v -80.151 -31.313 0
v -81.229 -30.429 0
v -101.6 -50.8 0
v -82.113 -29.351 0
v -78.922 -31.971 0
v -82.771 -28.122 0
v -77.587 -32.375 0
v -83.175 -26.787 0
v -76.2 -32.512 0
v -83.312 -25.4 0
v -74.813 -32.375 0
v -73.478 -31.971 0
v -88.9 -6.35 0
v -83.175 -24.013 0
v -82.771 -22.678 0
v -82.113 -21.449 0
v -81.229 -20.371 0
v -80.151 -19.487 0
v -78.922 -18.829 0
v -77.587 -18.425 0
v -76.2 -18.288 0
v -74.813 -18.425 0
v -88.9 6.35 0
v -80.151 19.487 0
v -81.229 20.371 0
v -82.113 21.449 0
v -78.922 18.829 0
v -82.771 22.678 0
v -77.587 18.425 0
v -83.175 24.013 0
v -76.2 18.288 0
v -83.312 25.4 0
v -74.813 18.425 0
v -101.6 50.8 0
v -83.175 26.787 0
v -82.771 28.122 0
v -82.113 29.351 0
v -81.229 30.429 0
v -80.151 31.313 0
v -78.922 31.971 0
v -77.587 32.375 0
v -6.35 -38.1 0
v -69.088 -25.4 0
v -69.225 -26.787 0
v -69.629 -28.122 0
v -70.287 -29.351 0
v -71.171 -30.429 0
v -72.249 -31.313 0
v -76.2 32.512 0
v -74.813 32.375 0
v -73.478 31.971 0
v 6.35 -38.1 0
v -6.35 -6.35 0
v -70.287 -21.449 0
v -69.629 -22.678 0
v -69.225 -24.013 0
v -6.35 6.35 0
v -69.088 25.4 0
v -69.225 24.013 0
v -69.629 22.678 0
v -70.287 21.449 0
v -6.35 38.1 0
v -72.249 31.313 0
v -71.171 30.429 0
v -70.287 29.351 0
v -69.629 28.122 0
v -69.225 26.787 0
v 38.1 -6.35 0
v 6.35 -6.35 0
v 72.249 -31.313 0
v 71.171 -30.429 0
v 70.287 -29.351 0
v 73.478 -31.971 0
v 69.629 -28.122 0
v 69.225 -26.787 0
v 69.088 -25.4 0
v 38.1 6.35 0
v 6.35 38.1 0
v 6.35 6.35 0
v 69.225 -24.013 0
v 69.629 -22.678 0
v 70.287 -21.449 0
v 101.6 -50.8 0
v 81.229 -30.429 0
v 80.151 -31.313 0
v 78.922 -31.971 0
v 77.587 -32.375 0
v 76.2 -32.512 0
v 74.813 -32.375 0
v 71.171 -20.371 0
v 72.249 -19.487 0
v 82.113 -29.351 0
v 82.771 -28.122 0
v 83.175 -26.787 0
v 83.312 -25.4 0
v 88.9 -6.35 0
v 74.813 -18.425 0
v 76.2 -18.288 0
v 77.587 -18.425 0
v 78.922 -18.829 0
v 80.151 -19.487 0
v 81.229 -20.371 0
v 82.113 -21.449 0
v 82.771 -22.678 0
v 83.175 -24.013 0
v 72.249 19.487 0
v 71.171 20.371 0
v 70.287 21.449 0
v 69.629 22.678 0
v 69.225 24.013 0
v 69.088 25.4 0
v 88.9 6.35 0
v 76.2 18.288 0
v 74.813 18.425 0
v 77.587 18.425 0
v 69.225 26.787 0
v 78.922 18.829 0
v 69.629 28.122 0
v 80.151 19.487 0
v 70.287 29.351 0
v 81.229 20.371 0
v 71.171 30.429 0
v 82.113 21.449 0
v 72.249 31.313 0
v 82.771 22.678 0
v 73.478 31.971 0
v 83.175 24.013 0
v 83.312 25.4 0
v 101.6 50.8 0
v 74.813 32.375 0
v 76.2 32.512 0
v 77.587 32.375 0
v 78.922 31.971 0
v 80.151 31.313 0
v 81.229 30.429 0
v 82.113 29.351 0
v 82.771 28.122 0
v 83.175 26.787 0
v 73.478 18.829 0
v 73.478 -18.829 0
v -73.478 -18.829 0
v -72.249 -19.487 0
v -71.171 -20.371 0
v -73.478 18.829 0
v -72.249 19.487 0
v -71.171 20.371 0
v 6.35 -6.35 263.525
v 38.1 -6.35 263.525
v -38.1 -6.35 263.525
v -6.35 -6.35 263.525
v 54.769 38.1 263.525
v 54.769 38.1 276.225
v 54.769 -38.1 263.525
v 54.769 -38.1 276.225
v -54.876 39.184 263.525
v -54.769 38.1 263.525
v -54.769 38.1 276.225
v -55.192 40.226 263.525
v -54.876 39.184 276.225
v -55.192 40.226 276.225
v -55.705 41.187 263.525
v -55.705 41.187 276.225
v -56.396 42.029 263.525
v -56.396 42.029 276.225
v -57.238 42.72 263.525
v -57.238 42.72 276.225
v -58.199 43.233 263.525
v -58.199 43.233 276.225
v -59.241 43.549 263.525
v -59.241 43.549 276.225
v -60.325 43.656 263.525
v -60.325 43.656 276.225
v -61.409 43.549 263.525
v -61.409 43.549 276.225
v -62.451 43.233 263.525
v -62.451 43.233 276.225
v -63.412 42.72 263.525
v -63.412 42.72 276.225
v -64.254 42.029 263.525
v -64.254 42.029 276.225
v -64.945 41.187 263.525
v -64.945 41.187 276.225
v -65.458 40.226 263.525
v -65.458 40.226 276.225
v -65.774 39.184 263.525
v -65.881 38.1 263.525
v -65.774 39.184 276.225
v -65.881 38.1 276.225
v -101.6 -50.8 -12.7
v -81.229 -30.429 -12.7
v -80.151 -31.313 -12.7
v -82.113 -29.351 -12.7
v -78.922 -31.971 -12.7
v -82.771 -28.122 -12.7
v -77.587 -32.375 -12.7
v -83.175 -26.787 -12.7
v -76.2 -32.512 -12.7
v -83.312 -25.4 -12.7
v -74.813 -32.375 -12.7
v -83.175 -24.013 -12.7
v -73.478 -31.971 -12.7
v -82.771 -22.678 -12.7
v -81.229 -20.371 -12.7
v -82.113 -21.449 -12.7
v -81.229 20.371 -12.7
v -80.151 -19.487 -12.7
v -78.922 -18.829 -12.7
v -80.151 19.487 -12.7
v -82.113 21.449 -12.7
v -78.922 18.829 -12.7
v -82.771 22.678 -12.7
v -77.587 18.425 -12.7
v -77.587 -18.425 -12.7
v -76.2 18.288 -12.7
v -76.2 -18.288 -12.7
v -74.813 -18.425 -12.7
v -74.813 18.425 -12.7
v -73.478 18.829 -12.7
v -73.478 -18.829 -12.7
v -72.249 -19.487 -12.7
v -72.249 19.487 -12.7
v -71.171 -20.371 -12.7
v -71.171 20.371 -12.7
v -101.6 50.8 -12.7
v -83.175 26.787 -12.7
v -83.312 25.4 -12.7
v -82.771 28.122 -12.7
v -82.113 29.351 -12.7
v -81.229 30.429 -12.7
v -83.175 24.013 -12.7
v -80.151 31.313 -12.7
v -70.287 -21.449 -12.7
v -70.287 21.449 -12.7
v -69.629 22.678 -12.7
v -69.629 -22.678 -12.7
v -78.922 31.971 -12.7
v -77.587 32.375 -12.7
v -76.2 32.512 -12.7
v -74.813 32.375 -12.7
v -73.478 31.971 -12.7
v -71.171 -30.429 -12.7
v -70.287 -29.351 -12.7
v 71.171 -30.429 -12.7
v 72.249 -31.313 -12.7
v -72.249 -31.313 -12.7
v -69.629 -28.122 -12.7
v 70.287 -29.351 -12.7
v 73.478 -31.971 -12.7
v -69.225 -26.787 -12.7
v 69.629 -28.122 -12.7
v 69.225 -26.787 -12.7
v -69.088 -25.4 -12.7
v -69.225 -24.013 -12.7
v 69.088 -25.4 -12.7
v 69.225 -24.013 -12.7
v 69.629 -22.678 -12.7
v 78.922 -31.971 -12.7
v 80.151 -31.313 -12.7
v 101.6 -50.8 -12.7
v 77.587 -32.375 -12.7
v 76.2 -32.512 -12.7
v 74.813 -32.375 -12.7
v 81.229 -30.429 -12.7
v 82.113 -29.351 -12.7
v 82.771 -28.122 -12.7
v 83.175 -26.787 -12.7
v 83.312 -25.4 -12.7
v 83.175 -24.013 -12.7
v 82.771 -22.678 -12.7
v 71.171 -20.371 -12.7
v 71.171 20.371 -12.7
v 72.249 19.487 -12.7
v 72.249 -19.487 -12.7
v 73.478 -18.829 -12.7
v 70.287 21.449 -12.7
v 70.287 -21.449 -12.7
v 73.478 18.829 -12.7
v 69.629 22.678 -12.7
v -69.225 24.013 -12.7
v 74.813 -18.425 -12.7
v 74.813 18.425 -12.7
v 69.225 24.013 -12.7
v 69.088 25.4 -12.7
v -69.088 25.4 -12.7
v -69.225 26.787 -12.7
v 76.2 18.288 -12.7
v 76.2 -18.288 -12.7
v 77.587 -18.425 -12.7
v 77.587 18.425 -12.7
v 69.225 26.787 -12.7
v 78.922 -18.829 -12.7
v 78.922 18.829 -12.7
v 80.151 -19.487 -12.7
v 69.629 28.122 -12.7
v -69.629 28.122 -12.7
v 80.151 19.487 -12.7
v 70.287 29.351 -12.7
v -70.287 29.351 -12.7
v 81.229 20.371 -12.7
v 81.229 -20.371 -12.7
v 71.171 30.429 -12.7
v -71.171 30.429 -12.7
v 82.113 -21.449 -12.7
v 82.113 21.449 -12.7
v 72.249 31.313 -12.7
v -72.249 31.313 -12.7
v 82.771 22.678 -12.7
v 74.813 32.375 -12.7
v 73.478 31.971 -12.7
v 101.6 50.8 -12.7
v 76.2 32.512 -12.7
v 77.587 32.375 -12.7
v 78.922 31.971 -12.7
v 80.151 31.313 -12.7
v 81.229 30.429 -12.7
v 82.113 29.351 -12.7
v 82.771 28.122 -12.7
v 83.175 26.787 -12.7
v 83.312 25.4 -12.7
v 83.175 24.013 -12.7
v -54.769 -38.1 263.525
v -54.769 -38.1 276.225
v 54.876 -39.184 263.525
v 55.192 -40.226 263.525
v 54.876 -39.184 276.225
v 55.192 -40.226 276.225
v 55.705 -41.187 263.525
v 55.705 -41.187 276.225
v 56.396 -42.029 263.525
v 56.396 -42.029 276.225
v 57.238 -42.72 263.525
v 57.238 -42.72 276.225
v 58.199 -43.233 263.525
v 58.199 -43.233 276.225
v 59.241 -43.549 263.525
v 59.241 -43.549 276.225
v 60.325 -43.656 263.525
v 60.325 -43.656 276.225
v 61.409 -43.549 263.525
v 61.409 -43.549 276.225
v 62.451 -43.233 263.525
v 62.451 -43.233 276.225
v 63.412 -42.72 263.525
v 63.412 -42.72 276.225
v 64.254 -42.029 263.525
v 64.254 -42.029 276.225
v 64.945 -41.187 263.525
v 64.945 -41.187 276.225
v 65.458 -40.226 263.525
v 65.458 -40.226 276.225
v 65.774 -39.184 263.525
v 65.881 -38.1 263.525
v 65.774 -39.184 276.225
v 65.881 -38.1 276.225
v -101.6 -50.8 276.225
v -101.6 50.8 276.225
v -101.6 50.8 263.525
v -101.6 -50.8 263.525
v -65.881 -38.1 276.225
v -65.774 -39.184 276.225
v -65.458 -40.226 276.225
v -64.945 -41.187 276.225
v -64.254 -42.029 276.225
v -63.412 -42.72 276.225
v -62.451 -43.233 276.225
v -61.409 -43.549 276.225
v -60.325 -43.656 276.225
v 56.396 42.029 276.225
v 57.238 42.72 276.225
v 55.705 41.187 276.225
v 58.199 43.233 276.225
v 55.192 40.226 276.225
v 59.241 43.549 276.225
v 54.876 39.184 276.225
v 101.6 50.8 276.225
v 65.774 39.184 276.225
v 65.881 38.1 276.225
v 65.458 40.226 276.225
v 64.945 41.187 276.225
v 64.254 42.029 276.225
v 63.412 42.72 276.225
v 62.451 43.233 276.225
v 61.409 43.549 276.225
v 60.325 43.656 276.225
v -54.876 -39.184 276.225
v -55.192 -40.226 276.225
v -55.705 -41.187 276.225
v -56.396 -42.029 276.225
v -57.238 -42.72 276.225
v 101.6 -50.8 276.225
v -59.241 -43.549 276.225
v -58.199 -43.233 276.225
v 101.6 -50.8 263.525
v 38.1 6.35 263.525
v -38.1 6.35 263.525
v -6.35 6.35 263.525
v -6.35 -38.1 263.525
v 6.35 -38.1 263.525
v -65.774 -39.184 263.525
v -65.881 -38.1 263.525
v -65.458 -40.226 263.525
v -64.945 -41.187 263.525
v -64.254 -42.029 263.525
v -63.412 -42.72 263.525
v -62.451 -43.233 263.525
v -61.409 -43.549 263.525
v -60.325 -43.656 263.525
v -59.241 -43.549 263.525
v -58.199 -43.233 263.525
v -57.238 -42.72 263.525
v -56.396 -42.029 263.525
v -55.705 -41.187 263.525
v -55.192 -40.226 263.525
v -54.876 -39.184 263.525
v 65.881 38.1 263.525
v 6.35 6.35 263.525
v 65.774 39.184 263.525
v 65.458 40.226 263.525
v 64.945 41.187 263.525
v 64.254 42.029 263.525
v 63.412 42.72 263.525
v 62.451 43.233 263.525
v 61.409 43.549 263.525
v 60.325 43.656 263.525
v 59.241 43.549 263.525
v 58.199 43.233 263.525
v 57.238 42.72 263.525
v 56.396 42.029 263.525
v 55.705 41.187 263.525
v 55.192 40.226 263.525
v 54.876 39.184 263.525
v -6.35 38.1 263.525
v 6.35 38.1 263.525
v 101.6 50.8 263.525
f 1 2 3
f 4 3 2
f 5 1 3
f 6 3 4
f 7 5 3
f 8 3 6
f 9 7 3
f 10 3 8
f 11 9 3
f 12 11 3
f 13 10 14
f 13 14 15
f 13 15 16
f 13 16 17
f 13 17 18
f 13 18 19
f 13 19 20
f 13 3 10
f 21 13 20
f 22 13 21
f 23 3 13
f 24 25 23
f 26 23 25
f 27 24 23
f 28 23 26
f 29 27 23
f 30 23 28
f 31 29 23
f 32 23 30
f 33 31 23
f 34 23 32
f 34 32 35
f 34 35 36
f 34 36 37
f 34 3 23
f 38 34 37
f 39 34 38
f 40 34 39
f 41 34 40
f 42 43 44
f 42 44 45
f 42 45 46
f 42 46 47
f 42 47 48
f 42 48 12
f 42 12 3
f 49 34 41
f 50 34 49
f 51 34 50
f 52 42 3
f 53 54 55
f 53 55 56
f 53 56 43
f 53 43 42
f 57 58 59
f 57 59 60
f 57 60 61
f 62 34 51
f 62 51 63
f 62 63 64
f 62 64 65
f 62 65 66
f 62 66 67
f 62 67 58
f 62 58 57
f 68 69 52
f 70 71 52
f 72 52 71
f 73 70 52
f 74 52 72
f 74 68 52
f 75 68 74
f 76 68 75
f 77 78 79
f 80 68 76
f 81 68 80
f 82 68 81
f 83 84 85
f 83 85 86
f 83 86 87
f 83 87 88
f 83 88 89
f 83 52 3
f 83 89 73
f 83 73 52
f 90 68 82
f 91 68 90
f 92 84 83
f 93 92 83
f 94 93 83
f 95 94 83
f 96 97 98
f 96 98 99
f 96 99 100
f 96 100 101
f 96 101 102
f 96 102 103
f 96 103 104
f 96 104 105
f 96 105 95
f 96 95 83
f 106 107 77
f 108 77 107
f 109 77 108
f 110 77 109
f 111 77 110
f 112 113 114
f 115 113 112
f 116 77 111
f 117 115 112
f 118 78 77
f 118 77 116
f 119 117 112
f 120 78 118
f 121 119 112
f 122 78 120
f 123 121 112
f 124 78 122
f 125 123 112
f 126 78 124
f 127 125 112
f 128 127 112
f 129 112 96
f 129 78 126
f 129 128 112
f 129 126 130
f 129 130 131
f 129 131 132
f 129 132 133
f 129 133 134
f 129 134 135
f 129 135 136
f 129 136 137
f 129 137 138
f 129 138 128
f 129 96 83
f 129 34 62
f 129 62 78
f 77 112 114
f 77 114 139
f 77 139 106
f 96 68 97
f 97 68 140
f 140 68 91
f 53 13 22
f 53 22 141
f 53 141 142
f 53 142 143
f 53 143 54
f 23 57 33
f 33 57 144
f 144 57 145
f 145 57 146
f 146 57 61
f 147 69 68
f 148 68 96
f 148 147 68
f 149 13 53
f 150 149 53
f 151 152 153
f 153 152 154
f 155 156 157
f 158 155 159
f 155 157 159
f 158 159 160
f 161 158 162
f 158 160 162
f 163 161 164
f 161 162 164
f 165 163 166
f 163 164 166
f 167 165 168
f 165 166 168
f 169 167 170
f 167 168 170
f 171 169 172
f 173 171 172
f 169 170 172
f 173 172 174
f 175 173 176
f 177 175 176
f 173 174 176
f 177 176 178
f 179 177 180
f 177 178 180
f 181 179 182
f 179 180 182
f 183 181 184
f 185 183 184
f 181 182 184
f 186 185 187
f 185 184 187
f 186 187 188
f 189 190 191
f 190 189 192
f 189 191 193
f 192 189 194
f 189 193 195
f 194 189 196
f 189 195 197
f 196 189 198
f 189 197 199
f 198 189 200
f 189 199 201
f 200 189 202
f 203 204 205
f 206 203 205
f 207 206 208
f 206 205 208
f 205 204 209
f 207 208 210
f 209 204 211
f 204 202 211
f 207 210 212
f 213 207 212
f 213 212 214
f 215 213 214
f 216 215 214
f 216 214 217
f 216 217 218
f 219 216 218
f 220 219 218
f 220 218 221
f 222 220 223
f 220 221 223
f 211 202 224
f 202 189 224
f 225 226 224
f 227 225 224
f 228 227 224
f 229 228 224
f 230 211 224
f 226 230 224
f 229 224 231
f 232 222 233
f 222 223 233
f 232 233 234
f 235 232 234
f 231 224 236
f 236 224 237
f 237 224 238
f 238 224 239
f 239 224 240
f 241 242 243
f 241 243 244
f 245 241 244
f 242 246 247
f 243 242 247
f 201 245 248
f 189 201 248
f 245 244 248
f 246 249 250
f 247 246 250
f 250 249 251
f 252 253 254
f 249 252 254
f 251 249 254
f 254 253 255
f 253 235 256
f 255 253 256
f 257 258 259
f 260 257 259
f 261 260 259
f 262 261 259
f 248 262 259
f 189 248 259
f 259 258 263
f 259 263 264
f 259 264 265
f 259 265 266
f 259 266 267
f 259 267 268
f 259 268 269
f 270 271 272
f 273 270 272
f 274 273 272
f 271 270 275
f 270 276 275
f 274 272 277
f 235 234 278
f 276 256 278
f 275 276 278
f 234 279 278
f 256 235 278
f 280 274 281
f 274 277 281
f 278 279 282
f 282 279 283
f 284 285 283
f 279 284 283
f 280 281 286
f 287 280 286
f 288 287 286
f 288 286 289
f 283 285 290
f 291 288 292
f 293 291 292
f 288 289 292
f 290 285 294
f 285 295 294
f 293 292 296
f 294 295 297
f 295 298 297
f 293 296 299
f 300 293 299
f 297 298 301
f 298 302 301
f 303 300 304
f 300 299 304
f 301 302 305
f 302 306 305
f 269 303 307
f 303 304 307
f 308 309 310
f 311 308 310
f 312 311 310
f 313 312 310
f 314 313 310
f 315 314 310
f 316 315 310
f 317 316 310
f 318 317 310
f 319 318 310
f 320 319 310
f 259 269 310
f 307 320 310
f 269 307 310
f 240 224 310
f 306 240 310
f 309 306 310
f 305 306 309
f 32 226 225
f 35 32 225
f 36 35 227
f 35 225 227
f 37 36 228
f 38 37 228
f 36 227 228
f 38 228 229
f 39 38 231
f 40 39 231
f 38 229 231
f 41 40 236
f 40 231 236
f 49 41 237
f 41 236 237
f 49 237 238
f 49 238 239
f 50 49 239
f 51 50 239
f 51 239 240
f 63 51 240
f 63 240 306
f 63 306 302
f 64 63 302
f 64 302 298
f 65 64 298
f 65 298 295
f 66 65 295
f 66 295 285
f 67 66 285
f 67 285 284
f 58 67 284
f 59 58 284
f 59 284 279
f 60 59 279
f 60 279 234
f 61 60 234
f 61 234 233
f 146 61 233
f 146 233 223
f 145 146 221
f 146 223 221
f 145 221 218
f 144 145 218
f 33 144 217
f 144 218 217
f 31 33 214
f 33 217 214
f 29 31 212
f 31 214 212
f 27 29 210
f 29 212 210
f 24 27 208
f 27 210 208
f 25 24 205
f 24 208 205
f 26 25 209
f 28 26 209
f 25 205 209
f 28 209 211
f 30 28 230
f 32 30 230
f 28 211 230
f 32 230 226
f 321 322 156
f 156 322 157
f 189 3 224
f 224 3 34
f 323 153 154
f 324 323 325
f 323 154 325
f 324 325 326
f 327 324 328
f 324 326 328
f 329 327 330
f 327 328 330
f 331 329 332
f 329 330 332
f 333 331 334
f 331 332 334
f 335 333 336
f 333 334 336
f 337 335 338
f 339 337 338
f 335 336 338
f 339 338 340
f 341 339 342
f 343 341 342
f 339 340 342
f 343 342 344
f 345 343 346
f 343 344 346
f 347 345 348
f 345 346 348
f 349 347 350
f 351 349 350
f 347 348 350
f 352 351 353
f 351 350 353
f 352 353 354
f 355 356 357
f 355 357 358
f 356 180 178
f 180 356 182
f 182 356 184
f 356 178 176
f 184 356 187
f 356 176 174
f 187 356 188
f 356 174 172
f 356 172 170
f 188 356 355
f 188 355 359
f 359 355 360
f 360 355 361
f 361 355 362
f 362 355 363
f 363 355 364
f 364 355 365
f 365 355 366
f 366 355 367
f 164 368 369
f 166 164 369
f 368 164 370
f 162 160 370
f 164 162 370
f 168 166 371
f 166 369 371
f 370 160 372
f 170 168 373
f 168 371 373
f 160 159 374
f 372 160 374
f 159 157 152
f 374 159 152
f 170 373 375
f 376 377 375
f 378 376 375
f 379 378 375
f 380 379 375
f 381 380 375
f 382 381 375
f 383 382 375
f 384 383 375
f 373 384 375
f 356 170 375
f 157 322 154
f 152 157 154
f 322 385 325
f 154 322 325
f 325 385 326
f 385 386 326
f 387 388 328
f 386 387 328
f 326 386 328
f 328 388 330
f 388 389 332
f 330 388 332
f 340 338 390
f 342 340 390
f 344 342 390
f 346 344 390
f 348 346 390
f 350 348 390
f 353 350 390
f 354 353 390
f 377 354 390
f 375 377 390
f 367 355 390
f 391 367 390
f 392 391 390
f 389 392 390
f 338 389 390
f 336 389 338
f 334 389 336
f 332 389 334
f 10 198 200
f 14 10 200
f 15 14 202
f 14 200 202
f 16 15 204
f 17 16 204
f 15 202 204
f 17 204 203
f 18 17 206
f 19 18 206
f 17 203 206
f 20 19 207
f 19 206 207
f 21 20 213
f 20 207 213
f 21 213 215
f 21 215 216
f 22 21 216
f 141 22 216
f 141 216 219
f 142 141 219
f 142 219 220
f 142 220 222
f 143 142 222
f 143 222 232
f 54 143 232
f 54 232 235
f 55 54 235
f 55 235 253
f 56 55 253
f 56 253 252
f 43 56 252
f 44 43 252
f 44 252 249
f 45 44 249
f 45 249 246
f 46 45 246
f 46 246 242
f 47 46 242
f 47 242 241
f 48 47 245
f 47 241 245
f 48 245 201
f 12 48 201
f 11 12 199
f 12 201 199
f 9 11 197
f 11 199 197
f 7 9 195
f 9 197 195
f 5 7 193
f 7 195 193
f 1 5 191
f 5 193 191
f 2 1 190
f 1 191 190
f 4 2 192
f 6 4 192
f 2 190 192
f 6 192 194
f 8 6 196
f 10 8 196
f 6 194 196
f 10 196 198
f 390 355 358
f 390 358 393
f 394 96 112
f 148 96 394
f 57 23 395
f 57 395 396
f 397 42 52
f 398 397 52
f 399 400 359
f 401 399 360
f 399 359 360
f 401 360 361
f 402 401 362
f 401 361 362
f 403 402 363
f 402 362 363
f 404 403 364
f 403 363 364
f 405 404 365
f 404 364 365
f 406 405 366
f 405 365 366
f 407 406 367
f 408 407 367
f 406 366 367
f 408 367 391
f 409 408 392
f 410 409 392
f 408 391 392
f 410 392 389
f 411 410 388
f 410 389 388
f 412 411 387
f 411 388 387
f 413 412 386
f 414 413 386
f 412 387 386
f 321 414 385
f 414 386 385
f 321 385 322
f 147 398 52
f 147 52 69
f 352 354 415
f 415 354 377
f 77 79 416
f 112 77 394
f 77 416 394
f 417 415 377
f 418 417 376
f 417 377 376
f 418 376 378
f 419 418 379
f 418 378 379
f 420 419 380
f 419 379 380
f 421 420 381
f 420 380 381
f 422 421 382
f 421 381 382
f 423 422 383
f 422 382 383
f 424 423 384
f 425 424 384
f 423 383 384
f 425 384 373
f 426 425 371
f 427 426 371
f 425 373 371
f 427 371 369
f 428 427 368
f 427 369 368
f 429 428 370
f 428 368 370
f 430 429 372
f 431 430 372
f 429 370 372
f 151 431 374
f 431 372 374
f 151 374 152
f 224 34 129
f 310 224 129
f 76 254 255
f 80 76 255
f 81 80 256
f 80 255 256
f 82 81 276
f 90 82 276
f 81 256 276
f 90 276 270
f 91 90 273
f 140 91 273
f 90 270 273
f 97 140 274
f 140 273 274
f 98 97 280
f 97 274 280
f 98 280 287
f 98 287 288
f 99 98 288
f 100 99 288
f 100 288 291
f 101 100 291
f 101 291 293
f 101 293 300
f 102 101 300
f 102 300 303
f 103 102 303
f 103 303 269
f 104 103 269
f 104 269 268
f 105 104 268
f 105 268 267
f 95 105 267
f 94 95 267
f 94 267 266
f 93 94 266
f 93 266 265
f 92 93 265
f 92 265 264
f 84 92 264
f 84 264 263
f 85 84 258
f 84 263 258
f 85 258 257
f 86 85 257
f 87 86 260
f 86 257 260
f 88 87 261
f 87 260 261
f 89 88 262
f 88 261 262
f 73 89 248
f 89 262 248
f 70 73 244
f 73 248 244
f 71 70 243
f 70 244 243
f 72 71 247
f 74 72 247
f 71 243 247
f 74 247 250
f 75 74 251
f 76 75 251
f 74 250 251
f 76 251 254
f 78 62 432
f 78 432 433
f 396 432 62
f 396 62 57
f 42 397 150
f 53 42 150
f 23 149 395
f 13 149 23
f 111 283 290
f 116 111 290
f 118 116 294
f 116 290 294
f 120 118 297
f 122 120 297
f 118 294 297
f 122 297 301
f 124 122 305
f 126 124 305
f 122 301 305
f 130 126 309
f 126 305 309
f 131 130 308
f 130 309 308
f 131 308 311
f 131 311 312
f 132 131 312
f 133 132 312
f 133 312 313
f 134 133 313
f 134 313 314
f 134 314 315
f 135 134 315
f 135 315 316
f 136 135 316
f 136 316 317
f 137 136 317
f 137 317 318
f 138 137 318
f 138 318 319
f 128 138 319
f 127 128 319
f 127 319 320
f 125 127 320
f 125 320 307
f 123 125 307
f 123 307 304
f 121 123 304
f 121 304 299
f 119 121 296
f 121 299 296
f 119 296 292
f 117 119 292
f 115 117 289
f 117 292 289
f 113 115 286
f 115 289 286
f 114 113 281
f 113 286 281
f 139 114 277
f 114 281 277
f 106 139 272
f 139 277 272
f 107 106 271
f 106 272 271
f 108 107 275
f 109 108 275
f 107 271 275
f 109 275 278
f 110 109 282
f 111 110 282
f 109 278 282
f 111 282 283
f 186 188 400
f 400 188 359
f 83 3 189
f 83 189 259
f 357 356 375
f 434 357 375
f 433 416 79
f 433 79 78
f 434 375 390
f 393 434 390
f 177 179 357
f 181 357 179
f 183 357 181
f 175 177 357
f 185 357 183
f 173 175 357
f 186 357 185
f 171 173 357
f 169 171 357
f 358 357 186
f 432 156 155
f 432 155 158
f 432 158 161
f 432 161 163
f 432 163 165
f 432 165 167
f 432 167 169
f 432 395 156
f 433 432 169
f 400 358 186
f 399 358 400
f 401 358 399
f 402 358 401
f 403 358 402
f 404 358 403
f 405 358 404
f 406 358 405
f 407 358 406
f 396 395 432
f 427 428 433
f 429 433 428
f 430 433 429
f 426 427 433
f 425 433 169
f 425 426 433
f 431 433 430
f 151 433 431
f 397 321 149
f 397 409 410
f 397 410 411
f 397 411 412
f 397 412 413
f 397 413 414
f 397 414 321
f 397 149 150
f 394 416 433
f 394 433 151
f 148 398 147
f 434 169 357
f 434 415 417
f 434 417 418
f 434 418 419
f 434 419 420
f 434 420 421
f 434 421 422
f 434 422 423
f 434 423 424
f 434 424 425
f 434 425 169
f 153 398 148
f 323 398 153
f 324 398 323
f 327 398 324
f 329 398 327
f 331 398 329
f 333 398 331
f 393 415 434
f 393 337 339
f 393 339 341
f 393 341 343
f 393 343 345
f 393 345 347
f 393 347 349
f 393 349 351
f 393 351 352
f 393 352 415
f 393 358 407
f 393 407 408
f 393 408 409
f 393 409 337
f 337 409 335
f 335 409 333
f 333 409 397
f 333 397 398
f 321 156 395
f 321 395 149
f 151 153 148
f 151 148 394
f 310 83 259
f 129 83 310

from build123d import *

# Parameters (mm, degrees)
F0_W      = 203.2
F0_H      = 101.6
F1_DEPTH  = 12.7
F2_D      = 14.224
F4_W      = 203.2
F4_H      = 101.6
F5_DEPTH  = 12.7
F6_W      = 12.7
F6_H      = 31.75
F6_H_2    = 12.7
F6_W_2    = 31.75
F7_DEPTH  = 263.525
F9_DEPTH  = 25.4
F11_DEPTH = 12.7


with BuildPart() as f1:
    # F0 (on Top) → F1 (new body)
    with BuildSketch(Plane.XY):
        Rectangle(F0_W, F0_H)
    extrude(amount=-F1_DEPTH)

    # F2 (through all)
    with Locations(Plane.XY):
        with Locations((-76.2, 25.4), (76.2, 25.4), (76.2, -25.4), (-76.2, -25.4)):
            Hole(F2_D / 2)



with BuildPart() as f5:
    # F4 (on offset) → F5 (new body)
    with BuildSketch(Plane(origin=(0, 0, 276.225), x_dir=(1, 0, 0), z_dir=(0, 0, -1))):
        Rectangle(F4_W, F4_H)
    extrude(amount=F5_DEPTH)

    # F8 (on face) → F9 (cut)
    with BuildSketch(Plane.XY.offset(276.225)):
        with BuildLine():
            Line((-54.76875, -12.7), (-54.76875, 12.7))
            ThreePointArc((-54.76875, 12.7), (-60.325, 7.14375), (-65.88125, 12.7))
            Line((-65.88125, 12.7), (-65.88125, -12.7))
            ThreePointArc((-65.88125, -12.7), (-60.325, -7.14375), (-54.76875, -12.7))
        make_face()
        with BuildLine():
            ThreePointArc((-65.88125, 12.7), (-60.325, 7.14375), (-54.76875, 12.7))
            Line((-54.76875, 12.7), (-54.76875, 38.1))
            ThreePointArc((-54.76875, 38.1), (-60.325, 43.65625), (-65.88125, 38.1))
            Line((-65.88125, 38.1), (-65.88125, 12.7))
        make_face()
        with BuildLine():
            Line((-54.76875, -38.1), (-54.76875, -12.7))
            ThreePointArc((-54.76875, -12.7), (-60.325, -7.14375), (-65.88125, -12.7))
            Line((-65.88125, -12.7), (-65.88125, -38.1))
            ThreePointArc((-65.88125, -38.1), (-60.325, -43.65625), (-54.76875, -38.1))
        make_face()
        with BuildLine():
            Line((54.76875, 12.7), (54.76875, -12.7))
            ThreePointArc((54.76875, -12.7), (60.325, -7.14375), (65.88125, -12.7))
            Line((65.88125, -12.7), (65.88125, 12.7))
            ThreePointArc((65.88125, 12.7), (60.325, 7.14375), (54.76875, 12.7))
        make_face()
        with BuildLine():
            ThreePointArc((65.88125, -12.7), (60.325, -7.14375), (54.76875, -12.7))
            Line((54.76875, -12.7), (54.76875, -38.1))
            ThreePointArc((54.76875, -38.1), (60.325, -43.65625), (65.88125, -38.1))
            Line((65.88125, -38.1), (65.88125, -12.7))
        make_face()
        with BuildLine():
            Line((54.76875, 38.1), (54.76875, 12.7))
            ThreePointArc((54.76875, 12.7), (60.325, 7.14375), (65.88125, 12.7))
            Line((65.88125, 12.7), (65.88125, 38.1))
            ThreePointArc((65.88125, 38.1), (60.325, 43.65625), (54.76875, 38.1))
        make_face()
    extrude(amount=-F9_DEPTH, mode=Mode.SUBTRACT)


with BuildPart() as f7:
    # F6 (on face) → F7 (new body, through all)
    with BuildSketch(Plane.XY):
        with Locations((0, 22.225)):
            Rectangle(F6_W, F6_H)
        Rectangle(F6_W, F6_H_2)
        with Locations((-22.225, 0)):
            Rectangle(F6_W_2, F6_H_2)
        with Locations((22.225, 0)):
            Rectangle(F6_W_2, F6_H_2)
        with Locations((0, -22.225)):
            Rectangle(F6_W, F6_H)
    extrude(amount=F7_DEPTH)


with BuildPart() as f1_1:
    add(f1.part)

    add(f5.part)  # F11 merges F5

    add(f7.part)  # F11 merges F7
    # F10 (on face) → F11 (join)
    with BuildSketch(Plane.XZ.offset(6.35)):
        Polygon((88.9, 0), (38.1, 263.5250000004), (38.1, 7e-10), align=None)
        Polygon((-88.9, 0), (-38.1, 0), (-38.1, 263.5250000004), align=None)
    extrude(amount=-F11_DEPTH)


solid = f1_1.part
